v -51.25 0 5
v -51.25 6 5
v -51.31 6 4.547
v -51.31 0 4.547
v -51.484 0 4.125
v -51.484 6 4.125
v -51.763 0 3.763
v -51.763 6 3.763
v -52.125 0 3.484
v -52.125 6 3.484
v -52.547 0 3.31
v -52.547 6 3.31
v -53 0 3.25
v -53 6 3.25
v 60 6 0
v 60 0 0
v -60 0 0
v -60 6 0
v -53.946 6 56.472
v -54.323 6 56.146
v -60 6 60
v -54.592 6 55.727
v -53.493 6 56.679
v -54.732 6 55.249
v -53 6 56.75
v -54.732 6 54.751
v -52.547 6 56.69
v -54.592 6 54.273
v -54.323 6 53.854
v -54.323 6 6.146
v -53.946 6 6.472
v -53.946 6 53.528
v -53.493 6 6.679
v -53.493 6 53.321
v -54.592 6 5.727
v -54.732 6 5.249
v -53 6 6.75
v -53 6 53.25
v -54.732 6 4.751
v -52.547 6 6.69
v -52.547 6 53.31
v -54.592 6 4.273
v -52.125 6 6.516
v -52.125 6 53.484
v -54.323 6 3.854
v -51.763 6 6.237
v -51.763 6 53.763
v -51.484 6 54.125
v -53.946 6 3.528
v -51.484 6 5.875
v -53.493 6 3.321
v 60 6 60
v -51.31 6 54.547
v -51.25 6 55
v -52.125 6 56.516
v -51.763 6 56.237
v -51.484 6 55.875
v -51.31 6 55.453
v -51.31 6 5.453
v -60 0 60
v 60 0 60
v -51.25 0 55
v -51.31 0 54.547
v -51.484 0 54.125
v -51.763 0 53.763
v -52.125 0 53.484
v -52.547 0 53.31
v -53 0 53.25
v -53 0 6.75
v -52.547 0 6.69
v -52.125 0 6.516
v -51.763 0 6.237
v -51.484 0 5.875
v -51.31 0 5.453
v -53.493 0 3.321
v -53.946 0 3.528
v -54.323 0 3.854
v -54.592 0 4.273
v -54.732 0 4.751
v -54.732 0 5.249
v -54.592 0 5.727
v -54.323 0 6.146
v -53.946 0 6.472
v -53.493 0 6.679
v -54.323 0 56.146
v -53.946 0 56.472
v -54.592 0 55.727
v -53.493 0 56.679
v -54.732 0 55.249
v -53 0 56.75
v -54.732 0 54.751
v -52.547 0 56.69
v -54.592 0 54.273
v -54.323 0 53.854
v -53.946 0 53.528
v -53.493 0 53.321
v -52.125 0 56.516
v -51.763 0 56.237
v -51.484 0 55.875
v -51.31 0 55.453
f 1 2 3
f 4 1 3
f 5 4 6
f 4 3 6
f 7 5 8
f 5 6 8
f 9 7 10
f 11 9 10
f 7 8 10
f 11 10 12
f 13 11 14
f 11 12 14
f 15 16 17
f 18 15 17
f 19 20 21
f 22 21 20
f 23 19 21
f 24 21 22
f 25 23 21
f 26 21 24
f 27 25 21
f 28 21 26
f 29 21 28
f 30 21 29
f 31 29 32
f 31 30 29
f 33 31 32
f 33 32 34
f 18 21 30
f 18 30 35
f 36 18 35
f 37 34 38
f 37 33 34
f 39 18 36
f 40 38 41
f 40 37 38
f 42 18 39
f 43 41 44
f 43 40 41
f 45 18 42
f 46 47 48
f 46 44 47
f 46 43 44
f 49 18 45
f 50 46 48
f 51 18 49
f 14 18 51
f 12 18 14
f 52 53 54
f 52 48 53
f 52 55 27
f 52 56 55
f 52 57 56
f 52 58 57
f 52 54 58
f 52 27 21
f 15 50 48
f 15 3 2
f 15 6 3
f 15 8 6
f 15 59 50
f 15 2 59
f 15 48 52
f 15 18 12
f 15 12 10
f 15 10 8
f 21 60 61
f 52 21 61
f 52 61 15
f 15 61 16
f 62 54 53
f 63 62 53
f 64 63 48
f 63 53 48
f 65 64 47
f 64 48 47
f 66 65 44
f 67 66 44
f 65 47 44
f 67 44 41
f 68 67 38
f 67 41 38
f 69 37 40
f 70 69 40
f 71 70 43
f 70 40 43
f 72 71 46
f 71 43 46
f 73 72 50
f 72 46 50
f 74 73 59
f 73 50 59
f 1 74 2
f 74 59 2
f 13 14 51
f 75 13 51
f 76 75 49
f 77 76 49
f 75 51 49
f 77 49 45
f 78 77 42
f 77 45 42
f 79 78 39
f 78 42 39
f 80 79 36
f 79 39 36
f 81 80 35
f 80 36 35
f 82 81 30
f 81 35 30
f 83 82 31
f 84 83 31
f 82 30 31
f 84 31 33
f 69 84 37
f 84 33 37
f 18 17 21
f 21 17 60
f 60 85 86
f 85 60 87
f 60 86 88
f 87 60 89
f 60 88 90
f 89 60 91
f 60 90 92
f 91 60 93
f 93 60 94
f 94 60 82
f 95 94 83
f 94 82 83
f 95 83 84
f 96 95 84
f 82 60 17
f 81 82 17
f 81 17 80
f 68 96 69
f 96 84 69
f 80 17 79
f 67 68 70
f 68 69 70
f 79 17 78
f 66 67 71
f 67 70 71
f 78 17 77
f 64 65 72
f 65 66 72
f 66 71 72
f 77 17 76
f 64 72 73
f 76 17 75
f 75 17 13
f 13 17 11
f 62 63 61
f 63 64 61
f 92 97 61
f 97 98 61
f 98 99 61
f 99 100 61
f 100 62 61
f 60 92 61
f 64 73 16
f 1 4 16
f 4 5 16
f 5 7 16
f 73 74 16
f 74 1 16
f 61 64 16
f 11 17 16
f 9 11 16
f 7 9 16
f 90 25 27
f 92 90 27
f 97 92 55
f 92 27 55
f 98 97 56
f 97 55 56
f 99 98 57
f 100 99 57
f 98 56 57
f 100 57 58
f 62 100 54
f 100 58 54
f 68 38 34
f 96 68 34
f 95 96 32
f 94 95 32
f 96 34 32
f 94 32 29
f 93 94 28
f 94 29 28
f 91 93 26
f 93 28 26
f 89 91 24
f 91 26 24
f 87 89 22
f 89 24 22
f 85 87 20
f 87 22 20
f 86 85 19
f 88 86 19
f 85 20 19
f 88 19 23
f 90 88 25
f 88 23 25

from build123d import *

# Parameters (mm, degrees)
EXTRUDE_1_DEPTH     = 6
CUT_EXTRUDE_1_DEPTH = 6


with BuildPart() as part:
    # 草图1 → 凸台-拉伸1 (new body)
    with BuildSketch(Plane(origin=(0, 0, 0), x_dir=(1, 0, 0), z_dir=(0, 1, 0))):
        Polygon((0, 0), (-60, 0), (-60, -60), (60, -60), (60, 0), align=None)
    extrude(amount=EXTRUDE_1_DEPTH)

    # 草图2 → 切除-拉伸1 (cut)
    with BuildSketch(Plane(origin=(0, 6, 0), x_dir=(1, 0, 0), z_dir=(0, 1, 0))):
        with BuildLine():
            ThreePointArc((-51.25, -5), (-51.762563133, -3.762563133), (-53, -3.25))
            Line((-53, -3.25), (-53, -5))
            Line((-53, -5), (-53, -6.75))
            ThreePointArc((-53, -6.75), (-51.762563133, -6.237436867), (-51.25, -5))
        make_face()
        with BuildLine():
            Line((-53, -5), (-53, -3.25))
            ThreePointArc((-53, -3.25), (-54.75, -5), (-53, -6.75))
            Line((-53, -6.75), (-53, -5))
        make_face()
        with BuildLine():
            ThreePointArc((-51.25, -55), (-51.762563133, -53.762563133), (-53, -53.25))
            Line((-53, -53.25), (-53, -55))
            Line((-53, -55), (-53, -56.75))
            ThreePointArc((-53, -56.75), (-51.762563133, -56.237436867), (-51.25, -55))
        make_face()
        with BuildLine():
            Line((-53, -55), (-53, -53.25))
            ThreePointArc((-53, -53.25), (-54.75, -55), (-53, -56.75))
            Line((-53, -56.75), (-53, -55))
        make_face()
    extrude(amount=-CUT_EXTRUDE_1_DEPTH, mode=Mode.SUBTRACT)


solid = part.part
